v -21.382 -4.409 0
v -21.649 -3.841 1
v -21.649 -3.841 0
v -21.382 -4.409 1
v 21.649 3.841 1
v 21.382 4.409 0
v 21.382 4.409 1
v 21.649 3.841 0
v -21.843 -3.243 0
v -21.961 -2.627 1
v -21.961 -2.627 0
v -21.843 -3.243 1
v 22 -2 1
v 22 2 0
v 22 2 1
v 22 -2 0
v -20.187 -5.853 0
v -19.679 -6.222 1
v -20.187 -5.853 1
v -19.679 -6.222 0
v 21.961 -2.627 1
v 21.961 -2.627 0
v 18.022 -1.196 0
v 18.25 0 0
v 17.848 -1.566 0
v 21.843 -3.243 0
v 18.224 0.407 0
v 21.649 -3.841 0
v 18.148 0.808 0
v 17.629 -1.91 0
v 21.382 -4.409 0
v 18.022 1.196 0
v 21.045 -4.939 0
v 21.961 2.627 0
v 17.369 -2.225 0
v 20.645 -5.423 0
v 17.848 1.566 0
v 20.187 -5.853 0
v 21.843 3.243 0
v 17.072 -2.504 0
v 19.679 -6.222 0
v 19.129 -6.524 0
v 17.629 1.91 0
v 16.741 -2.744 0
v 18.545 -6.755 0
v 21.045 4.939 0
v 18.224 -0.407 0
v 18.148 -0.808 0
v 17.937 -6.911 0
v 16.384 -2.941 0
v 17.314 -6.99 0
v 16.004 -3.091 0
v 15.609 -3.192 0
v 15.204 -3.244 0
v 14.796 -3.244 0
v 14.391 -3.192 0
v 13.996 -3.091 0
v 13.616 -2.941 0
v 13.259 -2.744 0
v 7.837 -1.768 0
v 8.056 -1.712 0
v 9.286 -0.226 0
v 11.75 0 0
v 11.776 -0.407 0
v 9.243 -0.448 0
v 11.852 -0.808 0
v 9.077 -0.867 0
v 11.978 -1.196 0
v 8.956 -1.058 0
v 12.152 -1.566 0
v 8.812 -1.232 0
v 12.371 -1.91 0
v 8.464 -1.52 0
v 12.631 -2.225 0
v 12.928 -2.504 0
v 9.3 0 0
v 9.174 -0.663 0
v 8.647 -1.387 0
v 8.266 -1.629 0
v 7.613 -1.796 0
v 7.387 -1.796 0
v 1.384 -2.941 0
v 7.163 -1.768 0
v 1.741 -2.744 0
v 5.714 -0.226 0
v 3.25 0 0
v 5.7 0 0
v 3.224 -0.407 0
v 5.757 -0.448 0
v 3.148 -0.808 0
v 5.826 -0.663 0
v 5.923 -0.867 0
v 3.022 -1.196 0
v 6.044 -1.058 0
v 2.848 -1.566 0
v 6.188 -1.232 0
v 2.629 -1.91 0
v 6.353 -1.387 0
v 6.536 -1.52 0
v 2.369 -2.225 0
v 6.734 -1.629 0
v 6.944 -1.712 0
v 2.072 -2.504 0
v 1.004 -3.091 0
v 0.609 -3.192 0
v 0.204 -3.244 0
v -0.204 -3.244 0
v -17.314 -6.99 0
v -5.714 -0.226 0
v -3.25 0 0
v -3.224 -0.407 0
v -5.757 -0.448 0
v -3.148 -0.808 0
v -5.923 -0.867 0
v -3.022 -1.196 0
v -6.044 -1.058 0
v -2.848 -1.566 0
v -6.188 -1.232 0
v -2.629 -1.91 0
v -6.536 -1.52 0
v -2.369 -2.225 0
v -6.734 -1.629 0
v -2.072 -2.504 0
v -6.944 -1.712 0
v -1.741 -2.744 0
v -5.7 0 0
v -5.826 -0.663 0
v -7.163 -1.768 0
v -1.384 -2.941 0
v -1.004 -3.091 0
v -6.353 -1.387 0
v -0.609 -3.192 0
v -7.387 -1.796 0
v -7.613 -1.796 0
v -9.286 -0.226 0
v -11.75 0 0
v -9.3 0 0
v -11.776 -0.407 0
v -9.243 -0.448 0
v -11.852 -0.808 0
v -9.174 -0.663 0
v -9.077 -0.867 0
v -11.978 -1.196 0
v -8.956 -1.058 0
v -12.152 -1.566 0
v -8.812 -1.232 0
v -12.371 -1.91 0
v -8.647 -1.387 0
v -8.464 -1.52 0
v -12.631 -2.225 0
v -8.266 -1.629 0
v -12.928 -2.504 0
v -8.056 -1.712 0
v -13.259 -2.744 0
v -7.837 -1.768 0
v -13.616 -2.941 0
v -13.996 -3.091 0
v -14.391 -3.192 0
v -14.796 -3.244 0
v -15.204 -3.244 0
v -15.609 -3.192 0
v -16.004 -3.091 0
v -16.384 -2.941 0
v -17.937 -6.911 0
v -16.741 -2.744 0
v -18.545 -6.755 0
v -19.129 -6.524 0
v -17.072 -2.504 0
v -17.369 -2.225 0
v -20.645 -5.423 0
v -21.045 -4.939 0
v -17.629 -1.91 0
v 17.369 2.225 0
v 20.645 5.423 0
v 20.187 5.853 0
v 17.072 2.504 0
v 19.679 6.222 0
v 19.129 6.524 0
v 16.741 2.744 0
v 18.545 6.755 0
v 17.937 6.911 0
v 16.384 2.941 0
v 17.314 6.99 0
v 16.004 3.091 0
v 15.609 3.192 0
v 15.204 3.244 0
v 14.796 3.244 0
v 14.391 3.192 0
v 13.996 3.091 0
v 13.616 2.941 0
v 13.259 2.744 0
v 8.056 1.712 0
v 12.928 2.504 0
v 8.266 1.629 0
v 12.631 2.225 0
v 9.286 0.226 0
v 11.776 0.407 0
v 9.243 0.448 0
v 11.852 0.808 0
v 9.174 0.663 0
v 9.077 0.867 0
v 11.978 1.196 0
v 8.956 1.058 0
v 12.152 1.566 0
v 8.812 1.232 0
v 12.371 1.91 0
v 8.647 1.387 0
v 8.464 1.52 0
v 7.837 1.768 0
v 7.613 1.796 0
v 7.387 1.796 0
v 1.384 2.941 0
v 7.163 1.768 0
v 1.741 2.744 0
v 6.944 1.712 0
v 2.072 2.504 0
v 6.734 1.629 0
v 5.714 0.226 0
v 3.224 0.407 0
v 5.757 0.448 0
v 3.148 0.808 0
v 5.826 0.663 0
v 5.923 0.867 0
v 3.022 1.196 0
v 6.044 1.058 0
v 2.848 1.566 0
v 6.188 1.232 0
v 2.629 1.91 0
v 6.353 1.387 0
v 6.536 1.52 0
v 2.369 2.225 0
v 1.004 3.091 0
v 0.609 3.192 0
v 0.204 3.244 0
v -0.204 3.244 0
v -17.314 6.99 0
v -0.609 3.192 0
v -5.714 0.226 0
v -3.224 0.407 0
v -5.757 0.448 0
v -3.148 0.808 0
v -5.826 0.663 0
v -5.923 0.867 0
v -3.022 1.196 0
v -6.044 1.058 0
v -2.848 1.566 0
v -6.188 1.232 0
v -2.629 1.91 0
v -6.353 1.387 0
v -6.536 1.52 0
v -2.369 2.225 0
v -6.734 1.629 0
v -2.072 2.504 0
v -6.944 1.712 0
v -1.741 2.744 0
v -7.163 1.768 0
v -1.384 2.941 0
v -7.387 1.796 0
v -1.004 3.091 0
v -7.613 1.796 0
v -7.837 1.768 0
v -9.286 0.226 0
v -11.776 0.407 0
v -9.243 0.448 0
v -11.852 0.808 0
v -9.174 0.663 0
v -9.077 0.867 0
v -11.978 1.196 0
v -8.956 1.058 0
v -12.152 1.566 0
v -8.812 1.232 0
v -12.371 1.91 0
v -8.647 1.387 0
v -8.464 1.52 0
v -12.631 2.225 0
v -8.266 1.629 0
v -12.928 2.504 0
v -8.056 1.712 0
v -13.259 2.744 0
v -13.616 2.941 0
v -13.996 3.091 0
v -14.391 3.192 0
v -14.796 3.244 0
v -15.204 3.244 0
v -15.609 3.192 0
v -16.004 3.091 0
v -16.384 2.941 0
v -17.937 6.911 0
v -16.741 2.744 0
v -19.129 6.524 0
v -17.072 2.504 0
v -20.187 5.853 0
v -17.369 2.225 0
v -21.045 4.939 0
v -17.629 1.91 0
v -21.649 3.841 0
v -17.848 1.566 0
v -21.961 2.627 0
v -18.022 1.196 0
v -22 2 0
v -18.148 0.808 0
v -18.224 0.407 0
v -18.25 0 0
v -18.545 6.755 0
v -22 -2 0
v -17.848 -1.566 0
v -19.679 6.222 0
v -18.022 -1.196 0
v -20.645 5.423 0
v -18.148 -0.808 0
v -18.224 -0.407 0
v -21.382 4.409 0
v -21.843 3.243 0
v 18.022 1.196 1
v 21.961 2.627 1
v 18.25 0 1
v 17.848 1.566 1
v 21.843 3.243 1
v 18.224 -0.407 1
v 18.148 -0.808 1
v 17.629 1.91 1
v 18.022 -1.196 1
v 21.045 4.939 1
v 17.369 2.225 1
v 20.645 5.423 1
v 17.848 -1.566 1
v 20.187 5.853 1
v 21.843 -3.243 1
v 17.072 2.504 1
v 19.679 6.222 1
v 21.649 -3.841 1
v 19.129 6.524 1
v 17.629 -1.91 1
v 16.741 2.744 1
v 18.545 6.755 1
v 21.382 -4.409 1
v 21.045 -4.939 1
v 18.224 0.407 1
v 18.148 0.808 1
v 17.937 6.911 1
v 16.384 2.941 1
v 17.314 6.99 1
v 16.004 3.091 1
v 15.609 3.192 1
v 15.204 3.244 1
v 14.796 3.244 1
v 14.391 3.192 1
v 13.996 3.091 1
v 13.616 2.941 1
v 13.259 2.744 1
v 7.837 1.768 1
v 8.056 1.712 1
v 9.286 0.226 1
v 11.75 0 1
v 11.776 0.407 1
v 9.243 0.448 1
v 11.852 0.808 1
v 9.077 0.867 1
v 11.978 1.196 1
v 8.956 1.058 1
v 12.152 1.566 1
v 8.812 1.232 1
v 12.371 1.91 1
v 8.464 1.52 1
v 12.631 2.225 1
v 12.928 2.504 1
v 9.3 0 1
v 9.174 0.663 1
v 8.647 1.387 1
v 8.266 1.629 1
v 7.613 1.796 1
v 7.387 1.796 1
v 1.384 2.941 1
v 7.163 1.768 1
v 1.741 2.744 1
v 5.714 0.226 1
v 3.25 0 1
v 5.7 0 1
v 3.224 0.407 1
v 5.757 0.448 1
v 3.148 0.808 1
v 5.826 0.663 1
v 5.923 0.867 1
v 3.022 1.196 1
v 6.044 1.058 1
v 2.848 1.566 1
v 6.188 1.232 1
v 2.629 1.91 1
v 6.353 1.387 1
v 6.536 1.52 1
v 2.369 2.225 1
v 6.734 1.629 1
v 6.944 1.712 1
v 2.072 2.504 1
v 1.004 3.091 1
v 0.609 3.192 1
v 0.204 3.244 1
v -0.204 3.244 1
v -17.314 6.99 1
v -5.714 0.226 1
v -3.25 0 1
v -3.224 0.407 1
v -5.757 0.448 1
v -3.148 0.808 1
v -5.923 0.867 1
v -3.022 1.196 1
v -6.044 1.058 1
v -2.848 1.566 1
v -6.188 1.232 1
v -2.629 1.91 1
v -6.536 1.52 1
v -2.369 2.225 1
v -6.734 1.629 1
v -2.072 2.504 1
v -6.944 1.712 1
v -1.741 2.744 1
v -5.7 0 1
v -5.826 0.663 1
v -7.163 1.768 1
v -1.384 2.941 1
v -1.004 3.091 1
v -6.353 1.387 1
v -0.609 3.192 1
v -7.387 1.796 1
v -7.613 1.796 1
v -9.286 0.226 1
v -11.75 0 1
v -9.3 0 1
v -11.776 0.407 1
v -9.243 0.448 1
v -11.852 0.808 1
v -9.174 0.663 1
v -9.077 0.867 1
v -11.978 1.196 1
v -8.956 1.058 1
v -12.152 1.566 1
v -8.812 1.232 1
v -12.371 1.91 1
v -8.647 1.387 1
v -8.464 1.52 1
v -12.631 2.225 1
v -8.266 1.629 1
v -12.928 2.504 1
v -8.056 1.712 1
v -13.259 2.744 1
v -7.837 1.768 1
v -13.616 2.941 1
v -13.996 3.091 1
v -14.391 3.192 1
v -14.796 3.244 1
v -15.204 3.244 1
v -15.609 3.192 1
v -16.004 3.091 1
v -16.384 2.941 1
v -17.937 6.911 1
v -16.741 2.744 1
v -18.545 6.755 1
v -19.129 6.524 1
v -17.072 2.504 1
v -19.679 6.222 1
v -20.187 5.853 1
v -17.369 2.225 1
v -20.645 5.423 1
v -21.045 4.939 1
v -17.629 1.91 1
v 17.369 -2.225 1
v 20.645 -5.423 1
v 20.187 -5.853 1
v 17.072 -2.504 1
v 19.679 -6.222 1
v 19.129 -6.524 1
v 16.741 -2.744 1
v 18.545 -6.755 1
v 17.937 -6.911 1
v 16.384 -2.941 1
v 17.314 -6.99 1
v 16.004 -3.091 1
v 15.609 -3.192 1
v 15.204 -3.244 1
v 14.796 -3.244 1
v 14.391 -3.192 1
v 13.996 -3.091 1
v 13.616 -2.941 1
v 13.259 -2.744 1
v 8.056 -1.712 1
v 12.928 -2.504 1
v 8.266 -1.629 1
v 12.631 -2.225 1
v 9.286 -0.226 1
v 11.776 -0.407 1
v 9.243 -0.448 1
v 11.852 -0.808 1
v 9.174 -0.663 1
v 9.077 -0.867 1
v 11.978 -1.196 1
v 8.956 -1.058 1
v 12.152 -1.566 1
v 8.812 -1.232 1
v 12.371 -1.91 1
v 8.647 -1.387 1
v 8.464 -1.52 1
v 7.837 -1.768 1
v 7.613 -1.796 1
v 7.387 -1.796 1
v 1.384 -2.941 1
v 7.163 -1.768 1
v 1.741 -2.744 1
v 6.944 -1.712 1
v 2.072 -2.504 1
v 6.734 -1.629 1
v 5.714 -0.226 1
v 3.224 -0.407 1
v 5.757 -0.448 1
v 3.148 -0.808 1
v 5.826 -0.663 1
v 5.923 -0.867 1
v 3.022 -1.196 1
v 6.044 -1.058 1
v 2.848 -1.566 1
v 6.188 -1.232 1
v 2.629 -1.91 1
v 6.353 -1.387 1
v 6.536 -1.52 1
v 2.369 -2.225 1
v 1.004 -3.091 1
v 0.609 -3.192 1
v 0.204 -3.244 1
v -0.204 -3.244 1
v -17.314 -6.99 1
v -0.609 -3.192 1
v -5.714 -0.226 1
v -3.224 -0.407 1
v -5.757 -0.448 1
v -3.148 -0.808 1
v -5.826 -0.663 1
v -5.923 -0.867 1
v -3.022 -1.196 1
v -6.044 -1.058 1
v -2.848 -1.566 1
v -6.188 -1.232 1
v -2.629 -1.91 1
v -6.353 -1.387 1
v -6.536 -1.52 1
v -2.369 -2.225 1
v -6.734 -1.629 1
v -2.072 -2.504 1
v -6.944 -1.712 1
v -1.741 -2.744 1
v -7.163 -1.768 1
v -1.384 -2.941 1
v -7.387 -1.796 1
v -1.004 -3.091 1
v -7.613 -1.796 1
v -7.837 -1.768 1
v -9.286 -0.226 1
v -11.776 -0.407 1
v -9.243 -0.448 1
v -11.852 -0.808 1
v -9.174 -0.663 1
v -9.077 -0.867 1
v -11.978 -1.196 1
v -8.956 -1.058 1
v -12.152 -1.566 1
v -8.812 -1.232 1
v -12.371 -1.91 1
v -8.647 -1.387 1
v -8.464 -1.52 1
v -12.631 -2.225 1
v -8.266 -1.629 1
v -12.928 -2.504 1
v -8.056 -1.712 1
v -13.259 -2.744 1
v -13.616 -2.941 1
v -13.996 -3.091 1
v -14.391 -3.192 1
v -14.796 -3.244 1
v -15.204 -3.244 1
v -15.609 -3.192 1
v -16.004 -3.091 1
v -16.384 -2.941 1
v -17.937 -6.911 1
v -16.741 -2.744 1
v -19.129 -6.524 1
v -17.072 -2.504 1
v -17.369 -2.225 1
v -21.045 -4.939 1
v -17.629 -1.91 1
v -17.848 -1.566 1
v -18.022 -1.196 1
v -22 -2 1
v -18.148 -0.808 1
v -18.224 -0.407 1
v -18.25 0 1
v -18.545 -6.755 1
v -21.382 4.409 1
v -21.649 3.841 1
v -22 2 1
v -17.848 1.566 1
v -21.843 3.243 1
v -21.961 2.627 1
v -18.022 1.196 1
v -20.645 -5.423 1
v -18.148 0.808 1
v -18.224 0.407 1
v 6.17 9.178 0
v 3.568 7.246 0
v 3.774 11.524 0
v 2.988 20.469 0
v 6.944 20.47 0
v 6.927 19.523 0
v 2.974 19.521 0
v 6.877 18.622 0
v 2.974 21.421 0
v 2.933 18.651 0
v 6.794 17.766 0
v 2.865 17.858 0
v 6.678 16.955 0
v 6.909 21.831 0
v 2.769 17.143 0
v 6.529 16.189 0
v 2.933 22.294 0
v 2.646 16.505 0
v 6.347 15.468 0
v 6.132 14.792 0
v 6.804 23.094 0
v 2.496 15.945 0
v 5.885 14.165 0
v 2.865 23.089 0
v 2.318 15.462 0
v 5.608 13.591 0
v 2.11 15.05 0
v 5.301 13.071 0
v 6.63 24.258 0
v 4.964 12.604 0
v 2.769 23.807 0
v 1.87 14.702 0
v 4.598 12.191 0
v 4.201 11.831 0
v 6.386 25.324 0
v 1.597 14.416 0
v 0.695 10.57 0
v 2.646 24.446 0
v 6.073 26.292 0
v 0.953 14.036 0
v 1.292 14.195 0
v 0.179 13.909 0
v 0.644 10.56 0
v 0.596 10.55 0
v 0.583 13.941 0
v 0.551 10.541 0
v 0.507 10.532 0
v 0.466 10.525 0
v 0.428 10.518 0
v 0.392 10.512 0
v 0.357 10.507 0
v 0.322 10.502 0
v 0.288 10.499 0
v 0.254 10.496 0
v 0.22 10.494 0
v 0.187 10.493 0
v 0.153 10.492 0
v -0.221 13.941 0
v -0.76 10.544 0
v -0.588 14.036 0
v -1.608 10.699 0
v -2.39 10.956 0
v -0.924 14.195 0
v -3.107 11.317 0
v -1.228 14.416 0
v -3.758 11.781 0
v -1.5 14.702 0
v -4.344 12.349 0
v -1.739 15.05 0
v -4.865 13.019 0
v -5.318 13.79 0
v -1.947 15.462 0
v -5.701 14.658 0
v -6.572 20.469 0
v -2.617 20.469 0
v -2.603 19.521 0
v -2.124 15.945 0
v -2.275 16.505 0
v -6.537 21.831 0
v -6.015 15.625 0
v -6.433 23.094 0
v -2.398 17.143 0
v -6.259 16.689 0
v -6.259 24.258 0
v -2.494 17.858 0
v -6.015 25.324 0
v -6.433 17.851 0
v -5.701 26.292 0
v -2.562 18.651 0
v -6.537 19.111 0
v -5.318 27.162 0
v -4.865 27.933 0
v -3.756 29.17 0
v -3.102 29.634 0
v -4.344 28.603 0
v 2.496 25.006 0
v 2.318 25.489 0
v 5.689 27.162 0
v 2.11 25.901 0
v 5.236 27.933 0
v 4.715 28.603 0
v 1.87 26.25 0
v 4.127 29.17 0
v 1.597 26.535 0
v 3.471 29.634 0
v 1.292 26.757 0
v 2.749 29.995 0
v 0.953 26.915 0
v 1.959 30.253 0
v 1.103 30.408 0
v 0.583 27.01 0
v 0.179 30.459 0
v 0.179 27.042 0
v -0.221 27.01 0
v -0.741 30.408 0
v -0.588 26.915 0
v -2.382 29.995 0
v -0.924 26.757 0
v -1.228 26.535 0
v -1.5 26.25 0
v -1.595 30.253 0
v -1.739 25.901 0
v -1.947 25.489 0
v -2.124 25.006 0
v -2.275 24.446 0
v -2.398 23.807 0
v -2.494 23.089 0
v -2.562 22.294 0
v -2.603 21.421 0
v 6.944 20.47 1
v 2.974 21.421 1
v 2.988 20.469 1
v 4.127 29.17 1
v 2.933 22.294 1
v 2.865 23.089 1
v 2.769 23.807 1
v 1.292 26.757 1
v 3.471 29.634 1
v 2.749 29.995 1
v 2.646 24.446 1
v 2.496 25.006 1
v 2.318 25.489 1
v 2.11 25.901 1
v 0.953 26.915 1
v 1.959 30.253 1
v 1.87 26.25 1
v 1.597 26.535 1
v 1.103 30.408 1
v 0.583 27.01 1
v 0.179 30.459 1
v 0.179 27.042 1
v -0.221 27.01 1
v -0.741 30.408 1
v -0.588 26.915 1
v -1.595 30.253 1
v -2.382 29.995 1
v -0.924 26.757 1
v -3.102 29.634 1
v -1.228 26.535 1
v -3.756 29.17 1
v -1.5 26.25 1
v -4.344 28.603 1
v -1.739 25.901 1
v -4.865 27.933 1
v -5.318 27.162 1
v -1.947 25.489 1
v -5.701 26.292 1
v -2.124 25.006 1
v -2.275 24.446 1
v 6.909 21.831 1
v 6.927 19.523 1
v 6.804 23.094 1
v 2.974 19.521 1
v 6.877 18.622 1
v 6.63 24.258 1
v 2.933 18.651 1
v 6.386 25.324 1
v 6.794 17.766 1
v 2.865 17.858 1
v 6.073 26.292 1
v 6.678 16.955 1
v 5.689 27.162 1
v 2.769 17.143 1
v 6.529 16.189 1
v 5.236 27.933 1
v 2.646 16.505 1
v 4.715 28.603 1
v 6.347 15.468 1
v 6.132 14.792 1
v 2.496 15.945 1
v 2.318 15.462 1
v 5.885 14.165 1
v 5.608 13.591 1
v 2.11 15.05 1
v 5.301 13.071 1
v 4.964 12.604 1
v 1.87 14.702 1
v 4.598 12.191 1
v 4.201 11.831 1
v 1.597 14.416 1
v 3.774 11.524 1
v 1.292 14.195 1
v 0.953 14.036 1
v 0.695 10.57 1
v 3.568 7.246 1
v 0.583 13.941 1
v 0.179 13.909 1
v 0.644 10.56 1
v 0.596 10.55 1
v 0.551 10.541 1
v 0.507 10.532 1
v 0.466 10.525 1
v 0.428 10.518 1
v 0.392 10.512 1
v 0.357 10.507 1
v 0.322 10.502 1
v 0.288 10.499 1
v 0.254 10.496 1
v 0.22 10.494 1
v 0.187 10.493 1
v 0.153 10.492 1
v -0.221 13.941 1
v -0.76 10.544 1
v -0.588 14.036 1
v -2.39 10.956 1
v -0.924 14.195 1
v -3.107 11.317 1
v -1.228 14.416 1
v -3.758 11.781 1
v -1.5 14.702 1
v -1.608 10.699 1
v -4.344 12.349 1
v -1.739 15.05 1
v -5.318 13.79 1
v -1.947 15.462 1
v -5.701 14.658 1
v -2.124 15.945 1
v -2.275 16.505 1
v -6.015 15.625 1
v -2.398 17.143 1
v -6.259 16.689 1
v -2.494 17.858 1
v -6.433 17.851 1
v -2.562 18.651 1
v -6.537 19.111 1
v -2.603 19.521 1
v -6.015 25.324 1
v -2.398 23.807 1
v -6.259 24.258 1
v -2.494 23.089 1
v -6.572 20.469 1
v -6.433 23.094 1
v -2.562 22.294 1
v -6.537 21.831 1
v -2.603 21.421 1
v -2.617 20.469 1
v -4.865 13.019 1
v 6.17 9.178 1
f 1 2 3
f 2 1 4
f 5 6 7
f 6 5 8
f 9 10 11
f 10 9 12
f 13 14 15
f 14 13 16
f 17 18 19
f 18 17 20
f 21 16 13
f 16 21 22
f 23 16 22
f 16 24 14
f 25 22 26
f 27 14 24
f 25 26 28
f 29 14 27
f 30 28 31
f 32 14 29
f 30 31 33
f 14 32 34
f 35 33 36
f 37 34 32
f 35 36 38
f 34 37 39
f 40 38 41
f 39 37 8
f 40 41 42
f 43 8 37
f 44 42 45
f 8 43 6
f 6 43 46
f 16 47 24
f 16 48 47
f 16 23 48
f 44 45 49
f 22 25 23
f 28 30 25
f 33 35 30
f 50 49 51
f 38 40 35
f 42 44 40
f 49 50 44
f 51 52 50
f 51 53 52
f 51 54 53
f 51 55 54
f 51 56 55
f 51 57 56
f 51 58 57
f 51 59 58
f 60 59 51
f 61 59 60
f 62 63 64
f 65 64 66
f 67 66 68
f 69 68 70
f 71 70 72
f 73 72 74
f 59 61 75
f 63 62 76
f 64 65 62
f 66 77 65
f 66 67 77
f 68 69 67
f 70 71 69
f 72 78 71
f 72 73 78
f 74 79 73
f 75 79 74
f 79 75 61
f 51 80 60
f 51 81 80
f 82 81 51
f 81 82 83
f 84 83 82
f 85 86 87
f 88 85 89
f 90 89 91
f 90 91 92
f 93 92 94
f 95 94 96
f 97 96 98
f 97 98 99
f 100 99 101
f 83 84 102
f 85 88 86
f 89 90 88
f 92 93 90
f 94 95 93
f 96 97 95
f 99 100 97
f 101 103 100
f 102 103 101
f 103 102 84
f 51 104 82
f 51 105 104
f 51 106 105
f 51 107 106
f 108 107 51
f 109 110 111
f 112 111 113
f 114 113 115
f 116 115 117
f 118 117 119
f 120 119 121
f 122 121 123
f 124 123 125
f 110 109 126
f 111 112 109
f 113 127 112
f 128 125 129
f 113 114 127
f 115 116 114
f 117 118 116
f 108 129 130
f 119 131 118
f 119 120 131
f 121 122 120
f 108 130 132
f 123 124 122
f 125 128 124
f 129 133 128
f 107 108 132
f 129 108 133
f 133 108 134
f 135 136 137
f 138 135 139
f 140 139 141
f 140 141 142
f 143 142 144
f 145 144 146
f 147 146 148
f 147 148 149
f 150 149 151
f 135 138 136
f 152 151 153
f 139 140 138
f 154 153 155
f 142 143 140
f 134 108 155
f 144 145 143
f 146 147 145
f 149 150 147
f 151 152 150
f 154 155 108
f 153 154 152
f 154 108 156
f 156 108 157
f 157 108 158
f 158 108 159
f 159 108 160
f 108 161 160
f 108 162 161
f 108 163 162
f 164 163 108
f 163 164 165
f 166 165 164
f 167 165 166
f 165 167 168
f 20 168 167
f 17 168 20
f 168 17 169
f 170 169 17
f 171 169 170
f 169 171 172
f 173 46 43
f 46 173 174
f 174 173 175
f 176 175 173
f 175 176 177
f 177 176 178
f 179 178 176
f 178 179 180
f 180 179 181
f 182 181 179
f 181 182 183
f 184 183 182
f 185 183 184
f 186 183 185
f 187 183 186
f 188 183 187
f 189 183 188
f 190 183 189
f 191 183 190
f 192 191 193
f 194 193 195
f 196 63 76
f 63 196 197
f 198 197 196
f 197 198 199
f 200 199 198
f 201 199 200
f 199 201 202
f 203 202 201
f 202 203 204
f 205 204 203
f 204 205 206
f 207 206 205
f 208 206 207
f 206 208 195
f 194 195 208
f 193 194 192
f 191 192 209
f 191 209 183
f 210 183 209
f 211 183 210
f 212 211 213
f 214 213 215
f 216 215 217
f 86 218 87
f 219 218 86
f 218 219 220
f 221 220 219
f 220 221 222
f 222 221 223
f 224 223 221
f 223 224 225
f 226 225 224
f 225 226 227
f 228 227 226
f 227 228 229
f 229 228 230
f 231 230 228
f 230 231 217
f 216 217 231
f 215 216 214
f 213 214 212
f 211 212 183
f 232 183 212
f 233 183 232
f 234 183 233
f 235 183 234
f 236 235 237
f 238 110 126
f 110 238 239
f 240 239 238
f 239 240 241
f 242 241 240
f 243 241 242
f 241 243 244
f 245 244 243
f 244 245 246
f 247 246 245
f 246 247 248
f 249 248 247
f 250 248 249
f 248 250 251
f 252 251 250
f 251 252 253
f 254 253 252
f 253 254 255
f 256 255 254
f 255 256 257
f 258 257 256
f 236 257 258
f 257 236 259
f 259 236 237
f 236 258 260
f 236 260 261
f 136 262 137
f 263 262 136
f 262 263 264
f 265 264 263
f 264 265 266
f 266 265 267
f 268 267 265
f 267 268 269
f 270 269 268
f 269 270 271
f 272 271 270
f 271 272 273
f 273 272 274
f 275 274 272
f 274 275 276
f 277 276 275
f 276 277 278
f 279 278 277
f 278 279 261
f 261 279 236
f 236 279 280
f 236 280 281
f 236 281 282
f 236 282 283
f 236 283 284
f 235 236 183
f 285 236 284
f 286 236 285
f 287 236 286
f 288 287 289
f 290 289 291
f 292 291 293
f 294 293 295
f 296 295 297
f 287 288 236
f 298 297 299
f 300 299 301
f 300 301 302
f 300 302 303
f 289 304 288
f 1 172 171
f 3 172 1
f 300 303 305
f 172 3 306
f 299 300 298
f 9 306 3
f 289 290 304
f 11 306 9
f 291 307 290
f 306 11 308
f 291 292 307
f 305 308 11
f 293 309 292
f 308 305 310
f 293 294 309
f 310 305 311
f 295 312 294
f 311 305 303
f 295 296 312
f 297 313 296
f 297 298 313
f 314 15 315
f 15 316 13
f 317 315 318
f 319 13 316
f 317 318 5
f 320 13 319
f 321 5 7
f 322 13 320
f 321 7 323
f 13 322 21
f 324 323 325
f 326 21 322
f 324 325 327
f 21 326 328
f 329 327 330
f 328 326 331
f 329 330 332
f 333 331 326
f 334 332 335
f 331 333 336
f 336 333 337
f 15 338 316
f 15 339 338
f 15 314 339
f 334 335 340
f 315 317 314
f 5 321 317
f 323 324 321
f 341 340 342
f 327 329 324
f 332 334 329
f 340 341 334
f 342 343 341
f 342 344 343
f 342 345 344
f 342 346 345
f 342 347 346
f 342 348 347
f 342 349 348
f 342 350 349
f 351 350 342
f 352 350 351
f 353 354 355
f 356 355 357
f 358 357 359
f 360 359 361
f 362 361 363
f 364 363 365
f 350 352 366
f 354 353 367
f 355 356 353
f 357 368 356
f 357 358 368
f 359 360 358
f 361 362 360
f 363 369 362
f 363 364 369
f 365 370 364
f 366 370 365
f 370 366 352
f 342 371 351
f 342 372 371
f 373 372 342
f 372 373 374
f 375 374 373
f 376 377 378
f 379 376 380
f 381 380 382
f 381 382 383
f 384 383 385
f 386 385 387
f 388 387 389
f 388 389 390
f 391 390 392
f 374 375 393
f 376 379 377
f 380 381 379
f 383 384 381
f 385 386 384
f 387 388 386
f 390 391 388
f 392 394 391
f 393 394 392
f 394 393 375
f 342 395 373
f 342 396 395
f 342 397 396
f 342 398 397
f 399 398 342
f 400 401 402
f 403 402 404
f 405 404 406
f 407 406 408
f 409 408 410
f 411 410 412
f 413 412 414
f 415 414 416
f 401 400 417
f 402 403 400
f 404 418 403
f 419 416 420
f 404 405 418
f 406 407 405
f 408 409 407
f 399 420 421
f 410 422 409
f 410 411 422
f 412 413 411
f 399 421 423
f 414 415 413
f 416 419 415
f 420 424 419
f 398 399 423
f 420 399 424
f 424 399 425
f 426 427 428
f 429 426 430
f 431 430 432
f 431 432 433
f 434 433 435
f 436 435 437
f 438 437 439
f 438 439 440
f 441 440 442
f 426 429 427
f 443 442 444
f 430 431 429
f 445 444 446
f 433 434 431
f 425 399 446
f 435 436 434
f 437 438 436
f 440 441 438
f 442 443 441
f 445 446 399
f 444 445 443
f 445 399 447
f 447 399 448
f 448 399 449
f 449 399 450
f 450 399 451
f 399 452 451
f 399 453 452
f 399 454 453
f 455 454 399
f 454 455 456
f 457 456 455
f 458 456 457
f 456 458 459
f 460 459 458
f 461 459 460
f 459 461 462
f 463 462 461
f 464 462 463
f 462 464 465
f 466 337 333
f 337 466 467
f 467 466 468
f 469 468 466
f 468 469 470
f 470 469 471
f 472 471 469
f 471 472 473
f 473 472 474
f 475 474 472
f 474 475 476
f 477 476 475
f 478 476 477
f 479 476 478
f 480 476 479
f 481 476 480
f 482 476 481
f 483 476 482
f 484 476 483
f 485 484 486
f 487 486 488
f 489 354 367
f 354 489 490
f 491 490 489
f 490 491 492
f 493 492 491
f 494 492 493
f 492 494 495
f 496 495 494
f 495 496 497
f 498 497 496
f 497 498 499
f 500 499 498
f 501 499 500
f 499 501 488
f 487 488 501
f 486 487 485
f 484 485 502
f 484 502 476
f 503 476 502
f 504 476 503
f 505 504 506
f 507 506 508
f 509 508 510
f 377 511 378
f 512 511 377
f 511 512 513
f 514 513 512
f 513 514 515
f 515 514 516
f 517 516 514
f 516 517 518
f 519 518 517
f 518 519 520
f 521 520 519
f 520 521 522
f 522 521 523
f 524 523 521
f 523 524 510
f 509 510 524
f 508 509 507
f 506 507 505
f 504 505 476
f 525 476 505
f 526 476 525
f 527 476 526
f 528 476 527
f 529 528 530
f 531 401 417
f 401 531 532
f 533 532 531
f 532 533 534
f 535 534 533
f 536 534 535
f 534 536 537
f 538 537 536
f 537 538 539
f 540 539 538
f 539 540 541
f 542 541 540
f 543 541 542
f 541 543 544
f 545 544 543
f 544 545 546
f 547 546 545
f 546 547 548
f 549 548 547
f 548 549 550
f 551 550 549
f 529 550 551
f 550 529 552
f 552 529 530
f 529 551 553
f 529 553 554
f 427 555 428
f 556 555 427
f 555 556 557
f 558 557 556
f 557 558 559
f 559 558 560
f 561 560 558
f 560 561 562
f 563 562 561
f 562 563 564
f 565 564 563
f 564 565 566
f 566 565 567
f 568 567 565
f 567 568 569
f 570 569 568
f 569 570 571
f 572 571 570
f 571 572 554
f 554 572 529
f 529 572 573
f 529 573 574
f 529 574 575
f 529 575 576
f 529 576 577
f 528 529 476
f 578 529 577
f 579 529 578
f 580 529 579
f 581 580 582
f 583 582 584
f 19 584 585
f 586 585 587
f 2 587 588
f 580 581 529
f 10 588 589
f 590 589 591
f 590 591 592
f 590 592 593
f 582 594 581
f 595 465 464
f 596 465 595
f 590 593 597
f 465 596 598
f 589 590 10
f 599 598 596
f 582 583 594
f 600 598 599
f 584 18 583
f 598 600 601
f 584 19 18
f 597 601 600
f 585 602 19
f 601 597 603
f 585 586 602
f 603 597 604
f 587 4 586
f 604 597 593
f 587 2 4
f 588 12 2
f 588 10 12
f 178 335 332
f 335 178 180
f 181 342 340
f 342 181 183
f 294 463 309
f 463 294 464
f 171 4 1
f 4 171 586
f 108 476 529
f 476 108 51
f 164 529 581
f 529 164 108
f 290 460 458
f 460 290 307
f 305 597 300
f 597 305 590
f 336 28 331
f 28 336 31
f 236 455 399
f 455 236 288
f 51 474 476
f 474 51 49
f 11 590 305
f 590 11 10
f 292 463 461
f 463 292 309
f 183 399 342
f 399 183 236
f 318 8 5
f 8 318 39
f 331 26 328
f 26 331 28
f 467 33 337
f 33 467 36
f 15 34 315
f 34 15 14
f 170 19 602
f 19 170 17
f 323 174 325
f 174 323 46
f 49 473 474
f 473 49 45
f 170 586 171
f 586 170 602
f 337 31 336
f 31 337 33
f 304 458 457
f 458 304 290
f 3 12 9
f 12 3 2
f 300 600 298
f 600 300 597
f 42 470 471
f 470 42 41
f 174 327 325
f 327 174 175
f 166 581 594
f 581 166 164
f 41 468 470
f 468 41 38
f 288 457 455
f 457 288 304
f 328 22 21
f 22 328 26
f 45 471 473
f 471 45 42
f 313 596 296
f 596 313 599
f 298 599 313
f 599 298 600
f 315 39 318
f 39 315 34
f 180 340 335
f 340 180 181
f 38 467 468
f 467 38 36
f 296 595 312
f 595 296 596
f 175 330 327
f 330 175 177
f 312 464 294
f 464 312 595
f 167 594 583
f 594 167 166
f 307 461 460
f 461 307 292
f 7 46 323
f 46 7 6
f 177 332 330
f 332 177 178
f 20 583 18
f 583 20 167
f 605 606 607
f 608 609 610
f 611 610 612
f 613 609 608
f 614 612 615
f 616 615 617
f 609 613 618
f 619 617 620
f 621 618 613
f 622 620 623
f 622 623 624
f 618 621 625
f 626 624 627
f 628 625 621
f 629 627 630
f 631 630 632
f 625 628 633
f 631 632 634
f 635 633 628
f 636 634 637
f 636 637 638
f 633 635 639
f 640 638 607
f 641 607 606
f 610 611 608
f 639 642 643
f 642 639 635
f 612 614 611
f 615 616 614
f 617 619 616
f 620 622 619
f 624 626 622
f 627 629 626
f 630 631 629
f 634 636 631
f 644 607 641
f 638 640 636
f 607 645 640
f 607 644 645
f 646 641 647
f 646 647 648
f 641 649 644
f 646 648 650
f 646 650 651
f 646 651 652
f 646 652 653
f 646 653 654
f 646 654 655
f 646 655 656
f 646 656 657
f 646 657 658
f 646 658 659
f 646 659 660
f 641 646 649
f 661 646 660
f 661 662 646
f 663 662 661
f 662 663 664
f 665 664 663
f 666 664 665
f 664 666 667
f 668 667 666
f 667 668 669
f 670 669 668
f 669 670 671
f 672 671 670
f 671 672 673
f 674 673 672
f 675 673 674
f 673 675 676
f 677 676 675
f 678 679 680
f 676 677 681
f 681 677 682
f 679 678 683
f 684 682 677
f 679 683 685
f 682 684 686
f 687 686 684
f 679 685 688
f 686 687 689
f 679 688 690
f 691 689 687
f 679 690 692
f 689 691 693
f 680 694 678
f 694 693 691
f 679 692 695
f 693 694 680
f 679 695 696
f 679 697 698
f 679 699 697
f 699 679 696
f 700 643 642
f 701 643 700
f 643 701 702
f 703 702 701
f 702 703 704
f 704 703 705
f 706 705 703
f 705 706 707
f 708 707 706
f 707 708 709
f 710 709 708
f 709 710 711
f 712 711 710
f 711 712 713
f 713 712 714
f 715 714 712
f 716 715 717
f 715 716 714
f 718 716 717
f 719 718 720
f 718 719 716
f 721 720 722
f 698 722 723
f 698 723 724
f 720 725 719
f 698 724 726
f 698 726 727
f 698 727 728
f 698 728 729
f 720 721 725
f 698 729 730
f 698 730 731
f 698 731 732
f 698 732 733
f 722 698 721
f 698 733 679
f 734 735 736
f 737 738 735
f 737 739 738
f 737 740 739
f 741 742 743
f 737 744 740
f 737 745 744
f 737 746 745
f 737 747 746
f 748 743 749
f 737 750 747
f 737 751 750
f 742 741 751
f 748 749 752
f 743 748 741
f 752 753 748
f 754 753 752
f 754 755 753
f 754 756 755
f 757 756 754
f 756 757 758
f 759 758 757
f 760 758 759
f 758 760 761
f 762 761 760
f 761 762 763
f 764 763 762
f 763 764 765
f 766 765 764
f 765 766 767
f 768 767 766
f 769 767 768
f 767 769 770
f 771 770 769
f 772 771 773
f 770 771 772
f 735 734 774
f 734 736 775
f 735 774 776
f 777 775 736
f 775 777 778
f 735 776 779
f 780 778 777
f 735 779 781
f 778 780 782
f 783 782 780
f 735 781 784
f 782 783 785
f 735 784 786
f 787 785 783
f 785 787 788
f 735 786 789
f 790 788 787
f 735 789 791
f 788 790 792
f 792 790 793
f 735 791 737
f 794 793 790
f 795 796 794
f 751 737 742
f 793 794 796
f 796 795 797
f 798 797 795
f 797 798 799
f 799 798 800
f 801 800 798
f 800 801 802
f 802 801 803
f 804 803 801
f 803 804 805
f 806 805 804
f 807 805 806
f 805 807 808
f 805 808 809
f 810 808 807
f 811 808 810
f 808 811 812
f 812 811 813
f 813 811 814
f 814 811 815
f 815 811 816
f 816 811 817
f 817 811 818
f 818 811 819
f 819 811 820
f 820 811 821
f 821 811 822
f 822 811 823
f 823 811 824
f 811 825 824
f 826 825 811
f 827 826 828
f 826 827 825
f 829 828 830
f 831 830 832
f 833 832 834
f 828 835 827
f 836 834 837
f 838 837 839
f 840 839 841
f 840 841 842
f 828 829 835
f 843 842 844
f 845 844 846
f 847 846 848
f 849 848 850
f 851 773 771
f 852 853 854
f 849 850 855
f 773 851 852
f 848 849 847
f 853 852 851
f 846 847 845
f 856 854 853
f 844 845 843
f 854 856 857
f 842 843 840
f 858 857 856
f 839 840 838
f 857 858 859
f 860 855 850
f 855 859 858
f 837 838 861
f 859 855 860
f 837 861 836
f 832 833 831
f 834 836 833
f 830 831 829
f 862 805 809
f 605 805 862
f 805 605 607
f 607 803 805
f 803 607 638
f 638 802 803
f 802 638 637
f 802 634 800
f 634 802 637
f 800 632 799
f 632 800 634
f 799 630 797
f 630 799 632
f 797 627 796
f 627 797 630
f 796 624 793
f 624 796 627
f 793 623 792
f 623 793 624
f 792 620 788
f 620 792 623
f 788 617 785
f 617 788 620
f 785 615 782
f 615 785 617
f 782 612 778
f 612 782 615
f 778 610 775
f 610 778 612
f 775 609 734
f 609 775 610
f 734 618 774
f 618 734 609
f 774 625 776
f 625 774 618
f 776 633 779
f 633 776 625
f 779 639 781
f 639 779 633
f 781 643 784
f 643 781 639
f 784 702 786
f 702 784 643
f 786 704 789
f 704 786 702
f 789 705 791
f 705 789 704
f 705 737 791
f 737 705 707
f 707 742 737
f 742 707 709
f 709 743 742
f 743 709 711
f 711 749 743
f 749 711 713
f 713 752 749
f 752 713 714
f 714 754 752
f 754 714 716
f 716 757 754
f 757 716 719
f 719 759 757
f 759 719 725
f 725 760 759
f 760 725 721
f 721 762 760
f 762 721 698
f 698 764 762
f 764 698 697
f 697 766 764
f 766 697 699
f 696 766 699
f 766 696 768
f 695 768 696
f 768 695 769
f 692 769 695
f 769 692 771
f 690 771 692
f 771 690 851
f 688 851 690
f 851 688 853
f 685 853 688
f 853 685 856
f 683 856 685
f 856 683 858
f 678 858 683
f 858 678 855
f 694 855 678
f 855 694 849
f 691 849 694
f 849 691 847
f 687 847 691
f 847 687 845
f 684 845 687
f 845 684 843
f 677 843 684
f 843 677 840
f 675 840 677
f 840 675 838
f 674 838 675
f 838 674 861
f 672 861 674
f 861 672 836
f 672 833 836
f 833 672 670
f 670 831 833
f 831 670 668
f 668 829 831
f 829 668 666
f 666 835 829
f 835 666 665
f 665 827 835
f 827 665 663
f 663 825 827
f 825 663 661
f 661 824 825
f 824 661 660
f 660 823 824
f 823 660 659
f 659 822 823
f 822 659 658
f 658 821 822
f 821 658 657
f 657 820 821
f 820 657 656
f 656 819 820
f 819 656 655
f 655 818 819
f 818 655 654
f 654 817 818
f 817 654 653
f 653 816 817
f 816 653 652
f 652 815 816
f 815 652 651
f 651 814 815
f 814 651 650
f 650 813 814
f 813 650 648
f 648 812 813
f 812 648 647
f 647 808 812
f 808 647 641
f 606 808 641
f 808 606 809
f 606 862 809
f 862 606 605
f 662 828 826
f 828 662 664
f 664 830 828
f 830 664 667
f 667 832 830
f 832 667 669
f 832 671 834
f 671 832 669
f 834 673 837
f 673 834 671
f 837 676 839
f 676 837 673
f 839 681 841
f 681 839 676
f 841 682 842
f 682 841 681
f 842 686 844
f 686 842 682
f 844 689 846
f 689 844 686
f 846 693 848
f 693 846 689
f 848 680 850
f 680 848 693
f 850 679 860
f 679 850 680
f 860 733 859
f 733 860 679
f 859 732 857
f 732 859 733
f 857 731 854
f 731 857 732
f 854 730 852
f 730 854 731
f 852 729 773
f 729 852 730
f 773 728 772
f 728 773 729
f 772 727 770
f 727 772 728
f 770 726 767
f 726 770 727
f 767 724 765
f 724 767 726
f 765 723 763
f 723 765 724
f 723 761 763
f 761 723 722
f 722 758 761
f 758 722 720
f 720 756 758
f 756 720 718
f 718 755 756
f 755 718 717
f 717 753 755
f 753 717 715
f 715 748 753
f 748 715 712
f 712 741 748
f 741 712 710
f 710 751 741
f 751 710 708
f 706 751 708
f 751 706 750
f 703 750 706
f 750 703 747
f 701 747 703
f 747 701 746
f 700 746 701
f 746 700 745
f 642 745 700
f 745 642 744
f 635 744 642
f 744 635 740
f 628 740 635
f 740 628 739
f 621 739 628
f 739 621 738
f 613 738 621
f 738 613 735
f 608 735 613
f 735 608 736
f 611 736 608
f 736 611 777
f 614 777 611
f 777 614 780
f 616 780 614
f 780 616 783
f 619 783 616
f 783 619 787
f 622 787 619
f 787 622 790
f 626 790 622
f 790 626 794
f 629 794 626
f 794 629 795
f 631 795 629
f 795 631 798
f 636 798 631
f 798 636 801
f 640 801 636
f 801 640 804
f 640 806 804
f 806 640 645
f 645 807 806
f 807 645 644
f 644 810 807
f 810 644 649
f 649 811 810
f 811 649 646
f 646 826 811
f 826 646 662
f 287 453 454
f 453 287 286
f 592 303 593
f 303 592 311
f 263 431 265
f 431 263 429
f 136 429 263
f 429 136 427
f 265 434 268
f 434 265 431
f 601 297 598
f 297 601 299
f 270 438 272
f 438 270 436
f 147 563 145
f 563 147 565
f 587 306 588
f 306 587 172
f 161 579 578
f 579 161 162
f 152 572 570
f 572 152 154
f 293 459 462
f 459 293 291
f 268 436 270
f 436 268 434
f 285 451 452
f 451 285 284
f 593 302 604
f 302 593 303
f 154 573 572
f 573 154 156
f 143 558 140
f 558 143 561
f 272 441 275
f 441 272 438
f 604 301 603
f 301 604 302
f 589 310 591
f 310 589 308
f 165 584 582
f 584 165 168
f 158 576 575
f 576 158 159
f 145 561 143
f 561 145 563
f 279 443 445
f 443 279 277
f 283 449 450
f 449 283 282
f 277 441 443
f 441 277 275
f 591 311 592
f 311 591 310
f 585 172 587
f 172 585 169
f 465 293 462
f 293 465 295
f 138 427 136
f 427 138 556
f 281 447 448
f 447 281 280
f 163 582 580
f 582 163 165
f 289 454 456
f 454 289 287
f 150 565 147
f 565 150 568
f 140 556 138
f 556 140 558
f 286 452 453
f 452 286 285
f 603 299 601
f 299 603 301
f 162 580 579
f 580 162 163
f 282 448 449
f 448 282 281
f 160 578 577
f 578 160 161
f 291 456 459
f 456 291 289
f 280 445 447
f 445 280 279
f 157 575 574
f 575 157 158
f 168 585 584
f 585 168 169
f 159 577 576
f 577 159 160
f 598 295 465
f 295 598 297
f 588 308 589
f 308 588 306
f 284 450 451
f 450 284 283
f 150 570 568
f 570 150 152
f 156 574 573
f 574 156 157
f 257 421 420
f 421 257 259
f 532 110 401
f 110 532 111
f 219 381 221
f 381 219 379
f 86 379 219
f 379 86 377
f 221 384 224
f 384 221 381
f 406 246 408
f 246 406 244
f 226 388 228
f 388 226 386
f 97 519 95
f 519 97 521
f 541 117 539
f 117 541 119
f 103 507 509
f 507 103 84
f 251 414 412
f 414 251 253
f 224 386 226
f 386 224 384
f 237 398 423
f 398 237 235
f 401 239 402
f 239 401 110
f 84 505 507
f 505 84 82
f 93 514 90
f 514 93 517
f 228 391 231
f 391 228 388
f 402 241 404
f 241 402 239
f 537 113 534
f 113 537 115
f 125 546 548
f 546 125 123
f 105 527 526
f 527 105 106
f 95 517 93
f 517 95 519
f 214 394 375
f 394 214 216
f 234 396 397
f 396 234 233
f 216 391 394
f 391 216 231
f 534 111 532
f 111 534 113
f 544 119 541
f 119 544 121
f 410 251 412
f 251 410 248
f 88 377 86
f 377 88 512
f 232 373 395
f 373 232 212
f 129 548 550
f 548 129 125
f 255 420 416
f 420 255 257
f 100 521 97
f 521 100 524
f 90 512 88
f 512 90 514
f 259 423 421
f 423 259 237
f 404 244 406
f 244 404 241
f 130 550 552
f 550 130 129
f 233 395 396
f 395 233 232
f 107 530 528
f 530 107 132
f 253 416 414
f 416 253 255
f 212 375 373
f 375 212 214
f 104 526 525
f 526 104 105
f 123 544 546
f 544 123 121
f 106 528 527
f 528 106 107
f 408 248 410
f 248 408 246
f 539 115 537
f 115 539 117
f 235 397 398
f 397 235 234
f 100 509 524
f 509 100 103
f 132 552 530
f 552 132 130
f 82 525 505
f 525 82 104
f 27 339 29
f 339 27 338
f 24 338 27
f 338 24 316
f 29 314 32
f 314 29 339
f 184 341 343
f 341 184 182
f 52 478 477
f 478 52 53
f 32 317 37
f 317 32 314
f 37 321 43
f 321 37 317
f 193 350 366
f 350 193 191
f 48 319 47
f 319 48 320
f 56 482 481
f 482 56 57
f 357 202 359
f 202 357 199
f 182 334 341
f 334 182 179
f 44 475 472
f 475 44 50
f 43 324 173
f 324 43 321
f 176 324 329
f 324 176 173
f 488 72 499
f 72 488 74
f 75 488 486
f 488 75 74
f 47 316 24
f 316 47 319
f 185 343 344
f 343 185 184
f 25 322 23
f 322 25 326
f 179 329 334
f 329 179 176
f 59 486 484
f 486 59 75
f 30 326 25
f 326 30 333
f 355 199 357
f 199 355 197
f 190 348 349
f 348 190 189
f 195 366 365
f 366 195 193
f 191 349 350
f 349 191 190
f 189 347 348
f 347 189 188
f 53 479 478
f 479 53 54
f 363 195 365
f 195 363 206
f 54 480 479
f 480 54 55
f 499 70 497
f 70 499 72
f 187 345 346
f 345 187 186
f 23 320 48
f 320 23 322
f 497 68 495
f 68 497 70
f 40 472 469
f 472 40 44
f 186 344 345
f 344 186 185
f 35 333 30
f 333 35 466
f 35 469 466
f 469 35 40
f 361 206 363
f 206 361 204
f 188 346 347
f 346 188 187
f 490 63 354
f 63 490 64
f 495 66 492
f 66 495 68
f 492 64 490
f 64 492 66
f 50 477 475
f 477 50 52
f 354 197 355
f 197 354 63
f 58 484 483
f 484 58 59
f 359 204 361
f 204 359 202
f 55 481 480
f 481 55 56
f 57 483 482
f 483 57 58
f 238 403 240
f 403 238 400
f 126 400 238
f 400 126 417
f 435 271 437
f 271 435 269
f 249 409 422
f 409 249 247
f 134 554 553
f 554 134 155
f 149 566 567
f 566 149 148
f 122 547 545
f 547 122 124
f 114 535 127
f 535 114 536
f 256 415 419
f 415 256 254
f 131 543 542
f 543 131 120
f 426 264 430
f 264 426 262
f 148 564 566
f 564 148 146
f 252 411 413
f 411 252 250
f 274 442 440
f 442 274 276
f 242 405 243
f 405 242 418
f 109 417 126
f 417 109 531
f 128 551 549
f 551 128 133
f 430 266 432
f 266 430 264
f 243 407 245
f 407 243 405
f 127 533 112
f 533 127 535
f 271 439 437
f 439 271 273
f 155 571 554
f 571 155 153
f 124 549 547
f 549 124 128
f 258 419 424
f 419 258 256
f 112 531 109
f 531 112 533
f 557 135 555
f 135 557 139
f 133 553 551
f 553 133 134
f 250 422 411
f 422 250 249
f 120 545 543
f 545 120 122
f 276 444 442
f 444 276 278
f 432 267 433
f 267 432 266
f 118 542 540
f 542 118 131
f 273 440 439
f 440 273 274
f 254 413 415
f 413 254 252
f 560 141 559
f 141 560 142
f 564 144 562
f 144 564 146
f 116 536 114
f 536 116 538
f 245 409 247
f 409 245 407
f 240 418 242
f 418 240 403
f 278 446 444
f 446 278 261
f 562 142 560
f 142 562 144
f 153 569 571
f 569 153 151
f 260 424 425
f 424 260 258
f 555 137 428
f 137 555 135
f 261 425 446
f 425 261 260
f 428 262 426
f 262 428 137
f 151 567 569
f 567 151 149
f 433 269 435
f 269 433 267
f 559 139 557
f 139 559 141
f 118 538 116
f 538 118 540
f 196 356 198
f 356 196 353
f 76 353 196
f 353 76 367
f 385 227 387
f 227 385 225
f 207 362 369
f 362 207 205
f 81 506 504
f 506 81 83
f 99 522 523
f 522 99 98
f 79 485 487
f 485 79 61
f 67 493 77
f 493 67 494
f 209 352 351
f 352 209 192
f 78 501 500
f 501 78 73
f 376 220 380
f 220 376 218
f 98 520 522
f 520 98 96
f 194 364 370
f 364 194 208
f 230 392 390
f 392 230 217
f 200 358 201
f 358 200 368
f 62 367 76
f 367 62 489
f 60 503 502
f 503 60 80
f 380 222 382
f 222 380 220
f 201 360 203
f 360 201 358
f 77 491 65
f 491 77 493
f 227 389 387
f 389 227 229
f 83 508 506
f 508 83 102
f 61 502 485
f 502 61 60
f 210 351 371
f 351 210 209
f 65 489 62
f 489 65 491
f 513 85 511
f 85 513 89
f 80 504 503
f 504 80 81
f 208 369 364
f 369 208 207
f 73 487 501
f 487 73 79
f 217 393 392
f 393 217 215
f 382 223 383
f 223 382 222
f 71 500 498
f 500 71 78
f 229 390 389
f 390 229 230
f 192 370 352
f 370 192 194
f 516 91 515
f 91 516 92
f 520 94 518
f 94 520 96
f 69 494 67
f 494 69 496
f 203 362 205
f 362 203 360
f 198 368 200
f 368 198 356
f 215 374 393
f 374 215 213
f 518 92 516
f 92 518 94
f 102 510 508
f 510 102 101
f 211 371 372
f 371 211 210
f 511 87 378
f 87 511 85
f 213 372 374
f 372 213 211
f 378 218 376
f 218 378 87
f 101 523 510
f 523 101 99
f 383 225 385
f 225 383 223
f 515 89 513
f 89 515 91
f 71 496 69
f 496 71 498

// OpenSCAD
$fn = 50;


difference() {
	union() {
		hull() {
			translate(v = [-17.0000000000, 2.0000000000, 0]) {
				cylinder(h = 1, r = 5);
			}
			translate(v = [17.0000000000, 2.0000000000, 0]) {
				cylinder(h = 1, r = 5);
			}
			translate(v = [-17.0000000000, -2.0000000000, 0]) {
				cylinder(h = 1, r = 5);
			}
			translate(v = [17.0000000000, -2.0000000000, 0]) {
				cylinder(h = 1, r = 5);
			}
		}
		translate(v = [0, 30.0000000000, 0]) {
			linear_extrude(height = 1) {
				text(font = "DejaVu Sans Mono:style=Bold", halign = "center", size = 19.0000000000, text = "Q", valign = "top");
			}
		}
	}
	union() {
		translate(v = [-15.0000000000, 0.0000000000, 0]) {
			translate(v = [0, 0, -100]) {
				cylinder(h = 200, r = 3.2500000000);
			}
		}
		translate(v = [0, 0, -100]) {
			cylinder(h = 200, r = 3.2500000000);
		}
		translate(v = [15.0000000000, 0.0000000000, 0]) {
			translate(v = [0, 0, -100]) {
				cylinder(h = 200, r = 3.2500000000);
			}
		}
		translate(v = [-15.0000000000, 0.0000000000, 0]) {
			translate(v = [0, 0, -100]) {
				cylinder(h = 200, r = 1.8000000000);
			}
		}
		translate(v = [-7.5000000000, 0.0000000000, 0]) {
			translate(v = [0, 0, -100]) {
				cylinder(h = 200, r = 1.8000000000);
			}
		}
		translate(v = [0, 0, -100]) {
			cylinder(h = 200, r = 1.8000000000);
		}
		translate(v = [7.5000000000, 0.0000000000, 0]) {
			translate(v = [0, 0, -100]) {
				cylinder(h = 200, r = 1.8000000000);
			}
		}
		translate(v = [15.0000000000, 0.0000000000, 0]) {
			translate(v = [0, 0, -100]) {
				cylinder(h = 200, r = 1.8000000000);
			}
		}
	}
}
